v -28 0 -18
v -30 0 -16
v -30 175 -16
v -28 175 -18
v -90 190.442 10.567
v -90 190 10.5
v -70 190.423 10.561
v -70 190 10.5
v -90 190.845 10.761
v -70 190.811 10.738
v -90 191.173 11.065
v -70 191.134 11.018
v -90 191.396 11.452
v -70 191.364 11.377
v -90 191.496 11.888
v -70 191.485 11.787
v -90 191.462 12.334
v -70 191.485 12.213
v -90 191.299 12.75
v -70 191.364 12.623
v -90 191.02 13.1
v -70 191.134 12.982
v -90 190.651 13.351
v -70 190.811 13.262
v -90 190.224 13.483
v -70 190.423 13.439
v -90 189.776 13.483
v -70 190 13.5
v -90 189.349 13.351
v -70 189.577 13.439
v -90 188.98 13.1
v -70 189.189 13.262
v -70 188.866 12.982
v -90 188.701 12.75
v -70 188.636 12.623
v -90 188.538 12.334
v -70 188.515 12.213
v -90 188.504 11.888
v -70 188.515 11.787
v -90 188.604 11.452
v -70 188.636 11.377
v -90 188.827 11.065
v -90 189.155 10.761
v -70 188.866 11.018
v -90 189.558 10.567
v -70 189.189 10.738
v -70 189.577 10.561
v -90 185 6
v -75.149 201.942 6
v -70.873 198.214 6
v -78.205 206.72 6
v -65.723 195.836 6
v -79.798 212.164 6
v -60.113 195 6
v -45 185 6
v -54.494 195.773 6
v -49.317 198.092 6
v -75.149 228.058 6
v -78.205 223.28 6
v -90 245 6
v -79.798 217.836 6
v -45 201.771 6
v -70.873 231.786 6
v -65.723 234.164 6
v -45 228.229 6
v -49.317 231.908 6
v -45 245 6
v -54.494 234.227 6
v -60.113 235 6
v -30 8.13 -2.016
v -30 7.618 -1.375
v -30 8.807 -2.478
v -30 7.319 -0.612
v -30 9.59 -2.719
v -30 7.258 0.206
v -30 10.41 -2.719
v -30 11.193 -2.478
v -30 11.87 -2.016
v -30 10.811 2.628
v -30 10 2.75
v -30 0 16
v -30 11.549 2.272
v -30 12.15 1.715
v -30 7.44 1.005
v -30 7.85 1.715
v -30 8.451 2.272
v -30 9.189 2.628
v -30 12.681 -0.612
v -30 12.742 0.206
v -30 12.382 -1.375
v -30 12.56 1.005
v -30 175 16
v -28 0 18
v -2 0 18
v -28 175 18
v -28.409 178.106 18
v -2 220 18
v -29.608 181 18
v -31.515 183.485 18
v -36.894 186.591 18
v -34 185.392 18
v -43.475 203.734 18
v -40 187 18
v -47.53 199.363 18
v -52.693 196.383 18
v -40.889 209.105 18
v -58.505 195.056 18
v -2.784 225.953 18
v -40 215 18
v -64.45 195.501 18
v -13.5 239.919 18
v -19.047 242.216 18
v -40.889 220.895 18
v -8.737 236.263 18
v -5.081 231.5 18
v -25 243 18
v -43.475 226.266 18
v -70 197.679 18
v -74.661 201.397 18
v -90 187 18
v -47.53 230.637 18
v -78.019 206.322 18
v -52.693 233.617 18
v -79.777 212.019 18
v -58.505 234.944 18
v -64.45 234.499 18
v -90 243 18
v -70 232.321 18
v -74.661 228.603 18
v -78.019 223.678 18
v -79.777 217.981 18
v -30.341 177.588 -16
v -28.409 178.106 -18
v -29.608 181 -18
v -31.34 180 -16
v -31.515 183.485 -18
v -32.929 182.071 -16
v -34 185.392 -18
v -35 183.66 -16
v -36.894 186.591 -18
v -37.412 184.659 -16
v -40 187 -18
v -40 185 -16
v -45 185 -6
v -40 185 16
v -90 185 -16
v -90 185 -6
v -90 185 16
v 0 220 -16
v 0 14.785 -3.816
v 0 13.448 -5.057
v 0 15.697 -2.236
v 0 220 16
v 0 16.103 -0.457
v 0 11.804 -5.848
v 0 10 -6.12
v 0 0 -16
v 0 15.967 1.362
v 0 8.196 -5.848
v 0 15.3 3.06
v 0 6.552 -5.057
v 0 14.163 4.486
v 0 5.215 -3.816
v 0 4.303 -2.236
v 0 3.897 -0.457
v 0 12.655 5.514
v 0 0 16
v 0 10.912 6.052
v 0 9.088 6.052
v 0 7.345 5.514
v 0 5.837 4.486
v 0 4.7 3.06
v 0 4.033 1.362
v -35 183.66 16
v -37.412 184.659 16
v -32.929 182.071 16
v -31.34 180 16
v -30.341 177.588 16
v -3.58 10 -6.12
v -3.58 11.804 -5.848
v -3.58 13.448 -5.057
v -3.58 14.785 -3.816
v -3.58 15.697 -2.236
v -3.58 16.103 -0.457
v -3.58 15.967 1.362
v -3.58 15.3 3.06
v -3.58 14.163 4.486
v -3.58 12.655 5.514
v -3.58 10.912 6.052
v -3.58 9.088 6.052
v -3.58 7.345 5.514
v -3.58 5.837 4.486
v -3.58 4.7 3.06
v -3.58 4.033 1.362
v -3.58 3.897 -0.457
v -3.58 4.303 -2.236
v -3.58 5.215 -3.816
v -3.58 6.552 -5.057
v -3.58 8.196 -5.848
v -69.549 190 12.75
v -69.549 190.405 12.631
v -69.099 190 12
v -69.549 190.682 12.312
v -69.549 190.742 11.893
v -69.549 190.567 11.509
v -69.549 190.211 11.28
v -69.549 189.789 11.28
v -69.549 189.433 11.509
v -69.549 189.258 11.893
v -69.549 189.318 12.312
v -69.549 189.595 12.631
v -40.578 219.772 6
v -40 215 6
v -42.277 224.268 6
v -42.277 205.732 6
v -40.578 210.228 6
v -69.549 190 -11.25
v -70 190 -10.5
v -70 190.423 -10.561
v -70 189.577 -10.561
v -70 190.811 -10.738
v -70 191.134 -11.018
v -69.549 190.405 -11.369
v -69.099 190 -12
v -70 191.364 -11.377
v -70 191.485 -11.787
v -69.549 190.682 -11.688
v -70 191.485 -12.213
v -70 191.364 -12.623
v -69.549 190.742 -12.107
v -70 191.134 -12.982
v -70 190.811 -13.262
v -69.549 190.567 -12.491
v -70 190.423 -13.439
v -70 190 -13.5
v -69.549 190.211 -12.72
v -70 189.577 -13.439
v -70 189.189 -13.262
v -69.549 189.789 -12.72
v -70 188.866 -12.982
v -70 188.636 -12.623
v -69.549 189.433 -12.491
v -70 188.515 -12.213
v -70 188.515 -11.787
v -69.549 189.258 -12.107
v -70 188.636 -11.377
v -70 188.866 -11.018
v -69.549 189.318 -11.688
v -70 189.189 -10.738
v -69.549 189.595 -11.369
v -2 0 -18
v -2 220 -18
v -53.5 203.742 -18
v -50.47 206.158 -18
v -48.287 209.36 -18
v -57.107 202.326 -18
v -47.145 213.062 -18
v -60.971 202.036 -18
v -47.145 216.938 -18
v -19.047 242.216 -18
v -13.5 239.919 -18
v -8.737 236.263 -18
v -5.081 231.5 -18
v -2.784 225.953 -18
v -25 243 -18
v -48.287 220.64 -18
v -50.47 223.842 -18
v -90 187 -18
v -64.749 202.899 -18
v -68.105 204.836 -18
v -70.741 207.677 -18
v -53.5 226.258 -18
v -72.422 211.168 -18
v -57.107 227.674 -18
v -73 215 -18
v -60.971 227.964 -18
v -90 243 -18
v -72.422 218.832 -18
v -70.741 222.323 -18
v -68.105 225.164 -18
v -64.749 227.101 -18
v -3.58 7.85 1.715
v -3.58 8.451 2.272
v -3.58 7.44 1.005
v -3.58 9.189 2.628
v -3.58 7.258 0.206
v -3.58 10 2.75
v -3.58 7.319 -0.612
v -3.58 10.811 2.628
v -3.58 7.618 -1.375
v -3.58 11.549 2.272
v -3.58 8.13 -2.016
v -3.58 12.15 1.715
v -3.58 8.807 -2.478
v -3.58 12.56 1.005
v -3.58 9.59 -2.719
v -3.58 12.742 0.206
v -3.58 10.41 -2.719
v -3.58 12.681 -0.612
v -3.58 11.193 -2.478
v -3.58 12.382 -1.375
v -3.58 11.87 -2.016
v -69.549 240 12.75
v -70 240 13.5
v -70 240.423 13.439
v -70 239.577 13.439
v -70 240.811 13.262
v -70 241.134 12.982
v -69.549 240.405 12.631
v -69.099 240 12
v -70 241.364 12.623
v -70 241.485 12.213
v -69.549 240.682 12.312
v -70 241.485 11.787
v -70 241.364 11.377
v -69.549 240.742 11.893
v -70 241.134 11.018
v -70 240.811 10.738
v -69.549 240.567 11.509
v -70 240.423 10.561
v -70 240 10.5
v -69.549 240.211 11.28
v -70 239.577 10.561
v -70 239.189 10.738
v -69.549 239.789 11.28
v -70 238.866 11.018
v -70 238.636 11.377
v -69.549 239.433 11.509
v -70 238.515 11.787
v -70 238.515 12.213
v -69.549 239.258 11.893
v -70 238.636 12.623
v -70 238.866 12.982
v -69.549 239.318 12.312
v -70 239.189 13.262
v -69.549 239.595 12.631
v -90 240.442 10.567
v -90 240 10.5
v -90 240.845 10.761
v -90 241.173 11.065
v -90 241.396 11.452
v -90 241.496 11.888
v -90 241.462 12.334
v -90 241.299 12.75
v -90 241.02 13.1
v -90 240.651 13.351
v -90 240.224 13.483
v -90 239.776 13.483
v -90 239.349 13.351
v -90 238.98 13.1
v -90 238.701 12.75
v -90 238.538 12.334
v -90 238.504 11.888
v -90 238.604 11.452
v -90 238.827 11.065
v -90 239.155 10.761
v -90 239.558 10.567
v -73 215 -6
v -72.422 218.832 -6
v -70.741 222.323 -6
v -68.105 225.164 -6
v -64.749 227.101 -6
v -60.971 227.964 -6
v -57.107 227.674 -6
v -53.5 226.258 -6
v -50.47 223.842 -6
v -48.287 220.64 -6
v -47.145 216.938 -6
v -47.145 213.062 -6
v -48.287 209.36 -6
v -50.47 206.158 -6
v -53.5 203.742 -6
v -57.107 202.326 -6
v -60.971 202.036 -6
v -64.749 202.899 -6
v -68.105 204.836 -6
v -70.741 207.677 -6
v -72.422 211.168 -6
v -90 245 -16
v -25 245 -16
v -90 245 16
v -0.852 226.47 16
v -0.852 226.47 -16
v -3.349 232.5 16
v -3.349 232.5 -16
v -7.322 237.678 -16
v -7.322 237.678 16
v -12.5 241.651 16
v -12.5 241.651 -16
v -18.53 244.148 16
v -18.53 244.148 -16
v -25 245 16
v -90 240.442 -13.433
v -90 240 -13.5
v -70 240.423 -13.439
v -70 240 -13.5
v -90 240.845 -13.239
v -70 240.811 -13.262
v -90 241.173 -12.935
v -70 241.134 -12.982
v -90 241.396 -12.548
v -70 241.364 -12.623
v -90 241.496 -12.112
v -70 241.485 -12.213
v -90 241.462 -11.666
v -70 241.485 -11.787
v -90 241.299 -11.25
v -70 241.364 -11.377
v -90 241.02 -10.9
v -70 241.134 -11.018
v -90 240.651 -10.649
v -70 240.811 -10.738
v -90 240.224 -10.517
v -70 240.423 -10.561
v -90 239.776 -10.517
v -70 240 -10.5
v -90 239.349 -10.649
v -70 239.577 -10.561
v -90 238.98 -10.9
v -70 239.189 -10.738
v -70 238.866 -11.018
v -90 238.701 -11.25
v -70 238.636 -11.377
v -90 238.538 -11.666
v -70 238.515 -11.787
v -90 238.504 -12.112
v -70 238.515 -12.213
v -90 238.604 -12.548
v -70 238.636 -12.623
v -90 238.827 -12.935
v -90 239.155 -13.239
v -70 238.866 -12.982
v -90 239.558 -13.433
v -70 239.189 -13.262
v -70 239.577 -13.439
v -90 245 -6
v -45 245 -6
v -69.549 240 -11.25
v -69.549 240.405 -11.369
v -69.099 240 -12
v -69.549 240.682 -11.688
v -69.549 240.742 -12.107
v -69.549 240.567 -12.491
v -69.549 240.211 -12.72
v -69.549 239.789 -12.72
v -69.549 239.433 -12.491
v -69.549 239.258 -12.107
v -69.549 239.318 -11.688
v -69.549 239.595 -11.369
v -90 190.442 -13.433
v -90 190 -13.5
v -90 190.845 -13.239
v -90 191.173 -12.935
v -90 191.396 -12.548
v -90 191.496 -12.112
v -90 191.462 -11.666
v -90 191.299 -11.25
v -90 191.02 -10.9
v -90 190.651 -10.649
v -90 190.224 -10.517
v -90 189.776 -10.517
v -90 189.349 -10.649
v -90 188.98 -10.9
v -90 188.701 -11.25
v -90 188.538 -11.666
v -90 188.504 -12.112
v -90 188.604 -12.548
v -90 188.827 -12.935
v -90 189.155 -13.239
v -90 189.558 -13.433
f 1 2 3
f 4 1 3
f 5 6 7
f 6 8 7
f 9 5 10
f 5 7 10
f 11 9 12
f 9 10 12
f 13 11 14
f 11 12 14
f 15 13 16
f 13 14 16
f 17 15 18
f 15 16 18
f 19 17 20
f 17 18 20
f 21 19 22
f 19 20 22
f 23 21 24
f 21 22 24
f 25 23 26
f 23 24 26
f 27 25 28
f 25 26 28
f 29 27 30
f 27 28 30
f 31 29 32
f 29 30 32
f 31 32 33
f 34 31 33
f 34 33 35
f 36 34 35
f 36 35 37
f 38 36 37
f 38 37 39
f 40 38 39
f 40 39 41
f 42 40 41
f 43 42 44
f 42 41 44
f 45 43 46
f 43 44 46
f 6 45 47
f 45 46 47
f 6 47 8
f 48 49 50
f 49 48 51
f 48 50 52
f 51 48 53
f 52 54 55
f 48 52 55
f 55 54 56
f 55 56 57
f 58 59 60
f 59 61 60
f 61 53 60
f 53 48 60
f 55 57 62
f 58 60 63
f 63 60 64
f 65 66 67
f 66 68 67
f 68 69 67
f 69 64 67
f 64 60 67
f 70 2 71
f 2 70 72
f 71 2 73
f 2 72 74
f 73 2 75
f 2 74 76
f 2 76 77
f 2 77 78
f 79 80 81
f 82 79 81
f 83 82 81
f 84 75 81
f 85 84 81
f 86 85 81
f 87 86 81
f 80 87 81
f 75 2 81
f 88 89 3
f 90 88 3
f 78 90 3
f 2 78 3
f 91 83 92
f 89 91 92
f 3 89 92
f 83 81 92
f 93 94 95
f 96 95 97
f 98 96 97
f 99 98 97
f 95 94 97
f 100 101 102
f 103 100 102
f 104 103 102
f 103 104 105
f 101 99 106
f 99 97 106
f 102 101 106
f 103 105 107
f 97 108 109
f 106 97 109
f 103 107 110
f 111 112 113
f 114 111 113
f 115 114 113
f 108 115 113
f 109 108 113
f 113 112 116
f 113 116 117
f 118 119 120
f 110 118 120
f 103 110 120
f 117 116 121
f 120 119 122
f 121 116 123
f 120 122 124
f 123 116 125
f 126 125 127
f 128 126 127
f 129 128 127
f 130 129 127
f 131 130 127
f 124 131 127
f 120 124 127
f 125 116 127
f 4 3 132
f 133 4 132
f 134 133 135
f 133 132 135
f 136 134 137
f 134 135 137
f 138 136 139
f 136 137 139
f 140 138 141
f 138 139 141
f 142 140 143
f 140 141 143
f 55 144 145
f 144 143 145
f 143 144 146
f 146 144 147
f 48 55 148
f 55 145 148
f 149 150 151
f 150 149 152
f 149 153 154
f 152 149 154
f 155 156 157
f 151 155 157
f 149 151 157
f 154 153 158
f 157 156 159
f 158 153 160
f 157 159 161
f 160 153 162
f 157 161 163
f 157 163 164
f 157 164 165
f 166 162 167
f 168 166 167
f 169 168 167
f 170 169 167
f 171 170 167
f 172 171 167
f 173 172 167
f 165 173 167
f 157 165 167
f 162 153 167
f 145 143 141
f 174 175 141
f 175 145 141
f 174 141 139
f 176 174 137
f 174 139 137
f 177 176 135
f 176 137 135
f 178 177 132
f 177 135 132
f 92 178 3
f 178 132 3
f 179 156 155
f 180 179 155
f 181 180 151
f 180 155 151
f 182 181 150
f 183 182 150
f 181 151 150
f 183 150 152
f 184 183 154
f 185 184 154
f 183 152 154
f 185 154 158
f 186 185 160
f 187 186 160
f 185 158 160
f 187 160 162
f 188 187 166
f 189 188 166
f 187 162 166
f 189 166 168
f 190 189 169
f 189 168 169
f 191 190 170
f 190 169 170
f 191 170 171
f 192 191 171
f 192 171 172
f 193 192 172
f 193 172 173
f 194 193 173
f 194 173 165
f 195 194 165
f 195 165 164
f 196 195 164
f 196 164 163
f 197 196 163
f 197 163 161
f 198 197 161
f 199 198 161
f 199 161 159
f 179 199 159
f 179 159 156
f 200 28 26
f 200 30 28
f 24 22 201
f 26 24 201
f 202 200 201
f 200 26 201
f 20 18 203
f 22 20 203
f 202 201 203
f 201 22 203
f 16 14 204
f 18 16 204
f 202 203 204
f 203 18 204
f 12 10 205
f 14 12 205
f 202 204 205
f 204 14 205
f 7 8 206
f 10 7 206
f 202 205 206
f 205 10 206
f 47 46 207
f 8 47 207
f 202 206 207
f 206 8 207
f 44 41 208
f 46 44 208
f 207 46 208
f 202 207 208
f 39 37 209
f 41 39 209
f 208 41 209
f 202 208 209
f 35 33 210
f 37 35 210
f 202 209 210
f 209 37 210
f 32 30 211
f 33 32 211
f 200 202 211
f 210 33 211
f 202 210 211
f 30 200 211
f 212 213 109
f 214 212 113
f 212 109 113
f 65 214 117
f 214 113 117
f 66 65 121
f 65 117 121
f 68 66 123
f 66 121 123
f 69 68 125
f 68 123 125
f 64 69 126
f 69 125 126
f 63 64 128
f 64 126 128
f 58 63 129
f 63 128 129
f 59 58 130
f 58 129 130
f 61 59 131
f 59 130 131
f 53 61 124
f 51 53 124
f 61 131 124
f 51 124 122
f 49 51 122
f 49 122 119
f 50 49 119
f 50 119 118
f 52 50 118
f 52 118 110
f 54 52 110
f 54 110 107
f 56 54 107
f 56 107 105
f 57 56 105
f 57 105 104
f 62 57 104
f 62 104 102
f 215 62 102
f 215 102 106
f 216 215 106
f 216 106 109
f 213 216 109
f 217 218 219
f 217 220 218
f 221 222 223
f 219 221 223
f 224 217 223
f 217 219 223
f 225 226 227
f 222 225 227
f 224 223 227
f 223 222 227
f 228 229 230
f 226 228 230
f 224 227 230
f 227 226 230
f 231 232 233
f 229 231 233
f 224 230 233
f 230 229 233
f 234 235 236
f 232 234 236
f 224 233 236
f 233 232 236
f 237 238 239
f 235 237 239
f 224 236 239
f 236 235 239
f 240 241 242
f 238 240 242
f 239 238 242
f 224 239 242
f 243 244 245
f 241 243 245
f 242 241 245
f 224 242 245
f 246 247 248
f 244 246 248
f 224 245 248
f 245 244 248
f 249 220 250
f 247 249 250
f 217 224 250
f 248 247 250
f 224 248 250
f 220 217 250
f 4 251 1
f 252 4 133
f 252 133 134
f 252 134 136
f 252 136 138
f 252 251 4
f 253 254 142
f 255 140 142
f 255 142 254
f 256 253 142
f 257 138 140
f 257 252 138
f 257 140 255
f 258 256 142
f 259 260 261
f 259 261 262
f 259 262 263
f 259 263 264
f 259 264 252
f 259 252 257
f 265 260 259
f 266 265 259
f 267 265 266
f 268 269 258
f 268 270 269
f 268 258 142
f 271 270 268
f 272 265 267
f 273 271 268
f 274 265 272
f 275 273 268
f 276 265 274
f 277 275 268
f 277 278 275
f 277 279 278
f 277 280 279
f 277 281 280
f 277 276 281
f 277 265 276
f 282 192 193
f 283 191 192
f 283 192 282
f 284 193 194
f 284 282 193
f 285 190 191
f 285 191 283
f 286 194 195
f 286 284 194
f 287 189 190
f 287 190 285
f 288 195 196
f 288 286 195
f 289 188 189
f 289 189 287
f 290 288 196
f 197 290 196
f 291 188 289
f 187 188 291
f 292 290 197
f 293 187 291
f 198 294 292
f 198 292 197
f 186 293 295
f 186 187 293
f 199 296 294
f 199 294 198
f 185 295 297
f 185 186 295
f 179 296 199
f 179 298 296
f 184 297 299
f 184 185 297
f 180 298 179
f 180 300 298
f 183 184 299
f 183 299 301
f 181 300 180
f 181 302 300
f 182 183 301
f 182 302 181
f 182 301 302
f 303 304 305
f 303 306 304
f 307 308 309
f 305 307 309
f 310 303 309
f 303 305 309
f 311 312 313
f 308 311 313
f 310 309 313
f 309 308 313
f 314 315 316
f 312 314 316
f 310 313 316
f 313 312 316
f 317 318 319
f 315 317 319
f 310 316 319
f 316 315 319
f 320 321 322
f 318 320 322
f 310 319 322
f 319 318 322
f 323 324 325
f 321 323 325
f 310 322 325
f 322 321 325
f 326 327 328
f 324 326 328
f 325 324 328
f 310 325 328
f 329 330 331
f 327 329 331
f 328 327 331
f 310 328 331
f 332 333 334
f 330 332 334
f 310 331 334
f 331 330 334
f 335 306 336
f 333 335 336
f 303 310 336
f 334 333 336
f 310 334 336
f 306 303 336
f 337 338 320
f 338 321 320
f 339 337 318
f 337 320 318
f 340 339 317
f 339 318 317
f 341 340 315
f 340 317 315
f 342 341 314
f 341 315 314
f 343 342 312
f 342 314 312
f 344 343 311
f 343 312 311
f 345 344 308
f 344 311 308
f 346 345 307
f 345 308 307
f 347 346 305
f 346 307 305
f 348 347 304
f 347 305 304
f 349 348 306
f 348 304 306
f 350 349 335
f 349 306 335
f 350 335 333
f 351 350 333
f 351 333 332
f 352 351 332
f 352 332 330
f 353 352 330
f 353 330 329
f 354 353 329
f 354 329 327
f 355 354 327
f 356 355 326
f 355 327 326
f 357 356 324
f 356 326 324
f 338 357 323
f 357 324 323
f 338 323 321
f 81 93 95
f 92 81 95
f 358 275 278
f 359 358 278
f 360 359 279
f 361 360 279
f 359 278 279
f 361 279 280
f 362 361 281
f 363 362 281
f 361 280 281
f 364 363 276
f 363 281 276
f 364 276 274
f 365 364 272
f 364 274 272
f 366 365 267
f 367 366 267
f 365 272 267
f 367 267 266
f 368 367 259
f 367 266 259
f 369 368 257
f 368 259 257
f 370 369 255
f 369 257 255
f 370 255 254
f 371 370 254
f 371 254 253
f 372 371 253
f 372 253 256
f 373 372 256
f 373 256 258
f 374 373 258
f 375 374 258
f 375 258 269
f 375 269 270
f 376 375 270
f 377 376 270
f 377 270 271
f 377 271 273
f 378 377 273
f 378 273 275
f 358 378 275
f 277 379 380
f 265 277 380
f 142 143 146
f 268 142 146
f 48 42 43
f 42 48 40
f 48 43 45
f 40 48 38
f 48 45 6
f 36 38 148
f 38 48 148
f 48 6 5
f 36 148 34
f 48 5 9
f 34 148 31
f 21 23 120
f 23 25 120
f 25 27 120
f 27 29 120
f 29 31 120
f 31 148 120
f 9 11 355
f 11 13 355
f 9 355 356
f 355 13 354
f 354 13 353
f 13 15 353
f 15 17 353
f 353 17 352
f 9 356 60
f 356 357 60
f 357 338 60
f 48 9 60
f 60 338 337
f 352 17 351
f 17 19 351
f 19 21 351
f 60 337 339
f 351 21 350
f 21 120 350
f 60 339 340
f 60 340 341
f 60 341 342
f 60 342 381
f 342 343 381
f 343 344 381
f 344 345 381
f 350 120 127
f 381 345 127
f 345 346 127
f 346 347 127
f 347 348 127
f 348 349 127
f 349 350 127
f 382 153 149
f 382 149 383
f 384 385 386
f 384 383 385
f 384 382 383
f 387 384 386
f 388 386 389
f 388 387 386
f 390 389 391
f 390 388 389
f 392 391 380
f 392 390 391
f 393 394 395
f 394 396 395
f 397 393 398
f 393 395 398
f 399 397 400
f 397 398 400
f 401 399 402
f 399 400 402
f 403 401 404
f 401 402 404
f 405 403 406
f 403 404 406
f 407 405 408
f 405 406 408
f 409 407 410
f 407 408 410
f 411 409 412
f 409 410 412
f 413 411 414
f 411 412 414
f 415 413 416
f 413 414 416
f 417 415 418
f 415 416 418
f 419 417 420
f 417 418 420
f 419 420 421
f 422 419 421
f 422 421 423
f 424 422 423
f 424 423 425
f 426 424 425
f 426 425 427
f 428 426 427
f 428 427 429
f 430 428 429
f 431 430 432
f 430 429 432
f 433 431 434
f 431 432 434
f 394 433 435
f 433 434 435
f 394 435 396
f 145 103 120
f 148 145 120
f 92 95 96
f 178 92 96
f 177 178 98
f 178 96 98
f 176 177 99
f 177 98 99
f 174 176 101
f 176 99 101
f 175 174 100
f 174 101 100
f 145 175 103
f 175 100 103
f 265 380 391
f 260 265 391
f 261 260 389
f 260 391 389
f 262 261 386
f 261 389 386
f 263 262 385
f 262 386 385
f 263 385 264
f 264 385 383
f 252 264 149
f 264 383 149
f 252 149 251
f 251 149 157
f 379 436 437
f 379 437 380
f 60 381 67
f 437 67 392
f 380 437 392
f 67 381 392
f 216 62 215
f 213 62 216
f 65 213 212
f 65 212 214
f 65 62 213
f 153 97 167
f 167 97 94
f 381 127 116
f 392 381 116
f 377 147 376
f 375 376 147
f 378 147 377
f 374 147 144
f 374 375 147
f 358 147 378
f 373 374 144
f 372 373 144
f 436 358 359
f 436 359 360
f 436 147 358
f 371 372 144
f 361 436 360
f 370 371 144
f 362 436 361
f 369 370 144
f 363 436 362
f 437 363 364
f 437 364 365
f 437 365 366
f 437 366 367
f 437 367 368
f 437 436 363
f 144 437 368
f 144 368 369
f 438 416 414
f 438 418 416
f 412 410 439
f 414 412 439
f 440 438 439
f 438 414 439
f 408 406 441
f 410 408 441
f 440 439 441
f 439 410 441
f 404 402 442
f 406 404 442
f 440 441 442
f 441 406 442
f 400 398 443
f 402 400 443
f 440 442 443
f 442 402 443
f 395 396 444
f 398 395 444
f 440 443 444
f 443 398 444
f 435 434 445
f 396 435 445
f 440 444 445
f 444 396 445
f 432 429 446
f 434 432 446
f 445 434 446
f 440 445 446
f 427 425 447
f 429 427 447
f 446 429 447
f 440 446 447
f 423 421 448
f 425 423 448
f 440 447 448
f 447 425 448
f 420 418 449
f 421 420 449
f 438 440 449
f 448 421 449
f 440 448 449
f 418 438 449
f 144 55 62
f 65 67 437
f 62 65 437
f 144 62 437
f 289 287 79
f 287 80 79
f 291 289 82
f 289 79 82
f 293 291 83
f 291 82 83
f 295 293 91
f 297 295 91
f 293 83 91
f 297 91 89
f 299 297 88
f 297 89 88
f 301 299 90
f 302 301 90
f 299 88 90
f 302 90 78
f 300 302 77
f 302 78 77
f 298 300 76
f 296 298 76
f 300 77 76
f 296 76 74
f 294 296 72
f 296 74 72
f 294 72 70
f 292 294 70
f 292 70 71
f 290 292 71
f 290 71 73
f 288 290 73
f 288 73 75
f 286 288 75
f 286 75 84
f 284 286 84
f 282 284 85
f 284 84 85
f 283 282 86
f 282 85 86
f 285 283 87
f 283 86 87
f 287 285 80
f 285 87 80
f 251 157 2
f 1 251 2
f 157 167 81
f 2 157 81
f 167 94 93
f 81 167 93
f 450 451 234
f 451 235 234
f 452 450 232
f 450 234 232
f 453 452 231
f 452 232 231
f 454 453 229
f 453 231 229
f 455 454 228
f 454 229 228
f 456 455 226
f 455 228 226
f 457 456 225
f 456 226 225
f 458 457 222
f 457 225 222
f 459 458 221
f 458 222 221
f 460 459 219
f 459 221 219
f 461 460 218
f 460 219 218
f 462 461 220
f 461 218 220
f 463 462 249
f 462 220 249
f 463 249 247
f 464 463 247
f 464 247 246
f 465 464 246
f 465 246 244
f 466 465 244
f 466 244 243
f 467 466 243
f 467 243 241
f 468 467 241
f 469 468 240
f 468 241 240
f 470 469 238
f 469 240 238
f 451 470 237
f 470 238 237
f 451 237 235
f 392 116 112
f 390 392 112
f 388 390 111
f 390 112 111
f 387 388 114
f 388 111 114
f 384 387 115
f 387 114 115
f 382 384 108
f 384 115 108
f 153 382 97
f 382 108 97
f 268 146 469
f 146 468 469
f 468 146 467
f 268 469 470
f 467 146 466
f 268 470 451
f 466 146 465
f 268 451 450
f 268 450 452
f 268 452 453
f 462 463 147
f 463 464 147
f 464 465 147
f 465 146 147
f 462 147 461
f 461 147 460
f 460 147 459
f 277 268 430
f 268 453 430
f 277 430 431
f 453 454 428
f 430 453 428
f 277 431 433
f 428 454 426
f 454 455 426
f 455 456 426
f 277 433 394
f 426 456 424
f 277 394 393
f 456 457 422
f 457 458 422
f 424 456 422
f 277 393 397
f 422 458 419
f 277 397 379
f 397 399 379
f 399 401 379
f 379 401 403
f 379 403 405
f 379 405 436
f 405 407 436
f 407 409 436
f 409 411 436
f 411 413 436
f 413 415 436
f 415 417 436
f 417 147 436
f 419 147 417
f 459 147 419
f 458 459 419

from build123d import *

# Parameters (mm, degrees)
BOSS_EXTRUDE1_DEPTH                     = 18
CUT_EXTRUDE1_REACH                      = 263.628
SKETCH3_W                               = 45
SKETCH3_H                               = 12
FILLET1_R                               = 25
FILLET2_R                               = 10
SKETCH4_R                               = 20
CUT_EXTRUDE2_DEPTH                      = 12
CUT_EXTRUDE3_REACH                      = 265.479
SKETCH5_R                               = 13
CHAMFER1_SIZE                           = 2
CBORE_FOR_M5_HEX_HEAD_BOLT1_D           = 5.5
CBORE_FOR_M5_HEX_HEAD_BOLT1_CBORE_D     = 12.24
CBORE_FOR_M5_HEX_HEAD_BOLT1_CBORE_DEPTH = 3.58
F_3_0MM_DOWEL_HOLE1_D                   = 3
F_3_0MM_DOWEL_HOLE1_DEPTH               = 20
F_3_0MM_DOWEL_HOLE1_TIP                 = 0.901290929


with BuildPart() as part:
    # Sketch1 → Boss-Extrude1 (new, symmetric)
    with BuildSketch(Plane.XY):
        Polygon((0, 0), (-30, 0), (-30, 185), (-90, 185), (-90, 245), (0, 245), align=None)
    extrude(amount=BOSS_EXTRUDE1_DEPTH, both=True)

    # Sketch3 → Cut-Extrude1 (cut, up to next)
    with BuildSketch(Plane(origin=(0, 245, 0), x_dir=(1, 0, 0), z_dir=(0, 1, 0)), mode=Mode.PRIVATE) as cut_extrude1_sk1:
        with Locations((-67.5, 0)):
            Rectangle(SKETCH3_W, SKETCH3_H)
    cut_extrude1_tool1 = extrude(cut_extrude1_sk1.sketch, amount=-CUT_EXTRUDE1_REACH, mode=Mode.PRIVATE) & part.part
    add(cut_extrude1_tool1.solids().sort_by_distance((-67.5, 245, 0))[0], mode=Mode.SUBTRACT)

    # Fillet1
    fillet1_edges = [part.edges().sort_by_distance(p)[0] for p in [
        (0, 245, 0),
    ]]
    fillet(fillet1_edges, radius=FILLET1_R)

    # Fillet2
    fillet2_edges = [part.edges().sort_by_distance(p)[0] for p in [
        (-30, 185, 0),
    ]]
    fillet(fillet2_edges, radius=FILLET2_R)

    # Sketch4 → Cut-Extrude2 (cut)
    with BuildSketch(Plane.XY.offset(18)):
        with Locations((-60, 215)):
            Circle(SKETCH4_R)
    extrude(amount=-CUT_EXTRUDE2_DEPTH, mode=Mode.SUBTRACT)

    # Sketch5 → Cut-Extrude3 (cut, up to next)
    with BuildSketch(Plane(origin=(0, 0, -18), x_dir=(-1, 0, 0), z_dir=(0, 0, -1)), mode=Mode.PRIVATE) as cut_extrude3_sk1:
        with Locations((60, 215)):
            Circle(SKETCH5_R)
    cut_extrude3_tool1 = extrude(cut_extrude3_sk1.sketch, amount=-CUT_EXTRUDE3_REACH, mode=Mode.PRIVATE) & part.part
    add(cut_extrude3_tool1.solids().sort_by_distance((-60, 215, -18))[0], mode=Mode.SUBTRACT)

    # Chamfer1
    chamfer1_edges = [part.edges().sort_by_distance(p)[0] for p in [
        (-65, 185, -18),
        (-57.5, 245, 18),
        (-7.32233047, 237.67766953, 18),
        (-57.5, 245, -18),
        (-7.32233047, 237.67766953, -18),
        (-30, 87.5, 18),
        (-30, 87.5, -18),
        (-32.928932188, 182.071067812, 18),
        (-32.928932188, 182.071067812, -18),
        (0, 110, -18),
        (-65, 185, 18),
        (0, 110, 18),
    ]]
    chamfer(chamfer1_edges, length=CHAMFER1_SIZE)

    # CBORE for M5 Hex Head Bolt1 (through all)
    with Locations(Plane(origin=(0, 0, 0), x_dir=(0, 0, -1), z_dir=(1, 0, 0))):
        with Locations((0, 10)):
            CounterBoreHole(CBORE_FOR_M5_HEX_HEAD_BOLT1_D / 2, CBORE_FOR_M5_HEX_HEAD_BOLT1_CBORE_D / 2, CBORE_FOR_M5_HEX_HEAD_BOLT1_CBORE_DEPTH)

    # Ø3.0mm Dowel Hole1
    with Locations(Plane.ZY.offset(90)):
        with Locations((12, 240), (-12, 190), (-12, 240), (12, 190)):
            Hole(F_3_0MM_DOWEL_HOLE1_D / 2, depth=F_3_0MM_DOWEL_HOLE1_DEPTH)
            with Locations((0, 0, -(F_3_0MM_DOWEL_HOLE1_DEPTH + F_3_0MM_DOWEL_HOLE1_TIP / 2))):  # 118° drill point
                Cone(0, F_3_0MM_DOWEL_HOLE1_D / 2, F_3_0MM_DOWEL_HOLE1_TIP, mode=Mode.SUBTRACT)


solid = part.part
